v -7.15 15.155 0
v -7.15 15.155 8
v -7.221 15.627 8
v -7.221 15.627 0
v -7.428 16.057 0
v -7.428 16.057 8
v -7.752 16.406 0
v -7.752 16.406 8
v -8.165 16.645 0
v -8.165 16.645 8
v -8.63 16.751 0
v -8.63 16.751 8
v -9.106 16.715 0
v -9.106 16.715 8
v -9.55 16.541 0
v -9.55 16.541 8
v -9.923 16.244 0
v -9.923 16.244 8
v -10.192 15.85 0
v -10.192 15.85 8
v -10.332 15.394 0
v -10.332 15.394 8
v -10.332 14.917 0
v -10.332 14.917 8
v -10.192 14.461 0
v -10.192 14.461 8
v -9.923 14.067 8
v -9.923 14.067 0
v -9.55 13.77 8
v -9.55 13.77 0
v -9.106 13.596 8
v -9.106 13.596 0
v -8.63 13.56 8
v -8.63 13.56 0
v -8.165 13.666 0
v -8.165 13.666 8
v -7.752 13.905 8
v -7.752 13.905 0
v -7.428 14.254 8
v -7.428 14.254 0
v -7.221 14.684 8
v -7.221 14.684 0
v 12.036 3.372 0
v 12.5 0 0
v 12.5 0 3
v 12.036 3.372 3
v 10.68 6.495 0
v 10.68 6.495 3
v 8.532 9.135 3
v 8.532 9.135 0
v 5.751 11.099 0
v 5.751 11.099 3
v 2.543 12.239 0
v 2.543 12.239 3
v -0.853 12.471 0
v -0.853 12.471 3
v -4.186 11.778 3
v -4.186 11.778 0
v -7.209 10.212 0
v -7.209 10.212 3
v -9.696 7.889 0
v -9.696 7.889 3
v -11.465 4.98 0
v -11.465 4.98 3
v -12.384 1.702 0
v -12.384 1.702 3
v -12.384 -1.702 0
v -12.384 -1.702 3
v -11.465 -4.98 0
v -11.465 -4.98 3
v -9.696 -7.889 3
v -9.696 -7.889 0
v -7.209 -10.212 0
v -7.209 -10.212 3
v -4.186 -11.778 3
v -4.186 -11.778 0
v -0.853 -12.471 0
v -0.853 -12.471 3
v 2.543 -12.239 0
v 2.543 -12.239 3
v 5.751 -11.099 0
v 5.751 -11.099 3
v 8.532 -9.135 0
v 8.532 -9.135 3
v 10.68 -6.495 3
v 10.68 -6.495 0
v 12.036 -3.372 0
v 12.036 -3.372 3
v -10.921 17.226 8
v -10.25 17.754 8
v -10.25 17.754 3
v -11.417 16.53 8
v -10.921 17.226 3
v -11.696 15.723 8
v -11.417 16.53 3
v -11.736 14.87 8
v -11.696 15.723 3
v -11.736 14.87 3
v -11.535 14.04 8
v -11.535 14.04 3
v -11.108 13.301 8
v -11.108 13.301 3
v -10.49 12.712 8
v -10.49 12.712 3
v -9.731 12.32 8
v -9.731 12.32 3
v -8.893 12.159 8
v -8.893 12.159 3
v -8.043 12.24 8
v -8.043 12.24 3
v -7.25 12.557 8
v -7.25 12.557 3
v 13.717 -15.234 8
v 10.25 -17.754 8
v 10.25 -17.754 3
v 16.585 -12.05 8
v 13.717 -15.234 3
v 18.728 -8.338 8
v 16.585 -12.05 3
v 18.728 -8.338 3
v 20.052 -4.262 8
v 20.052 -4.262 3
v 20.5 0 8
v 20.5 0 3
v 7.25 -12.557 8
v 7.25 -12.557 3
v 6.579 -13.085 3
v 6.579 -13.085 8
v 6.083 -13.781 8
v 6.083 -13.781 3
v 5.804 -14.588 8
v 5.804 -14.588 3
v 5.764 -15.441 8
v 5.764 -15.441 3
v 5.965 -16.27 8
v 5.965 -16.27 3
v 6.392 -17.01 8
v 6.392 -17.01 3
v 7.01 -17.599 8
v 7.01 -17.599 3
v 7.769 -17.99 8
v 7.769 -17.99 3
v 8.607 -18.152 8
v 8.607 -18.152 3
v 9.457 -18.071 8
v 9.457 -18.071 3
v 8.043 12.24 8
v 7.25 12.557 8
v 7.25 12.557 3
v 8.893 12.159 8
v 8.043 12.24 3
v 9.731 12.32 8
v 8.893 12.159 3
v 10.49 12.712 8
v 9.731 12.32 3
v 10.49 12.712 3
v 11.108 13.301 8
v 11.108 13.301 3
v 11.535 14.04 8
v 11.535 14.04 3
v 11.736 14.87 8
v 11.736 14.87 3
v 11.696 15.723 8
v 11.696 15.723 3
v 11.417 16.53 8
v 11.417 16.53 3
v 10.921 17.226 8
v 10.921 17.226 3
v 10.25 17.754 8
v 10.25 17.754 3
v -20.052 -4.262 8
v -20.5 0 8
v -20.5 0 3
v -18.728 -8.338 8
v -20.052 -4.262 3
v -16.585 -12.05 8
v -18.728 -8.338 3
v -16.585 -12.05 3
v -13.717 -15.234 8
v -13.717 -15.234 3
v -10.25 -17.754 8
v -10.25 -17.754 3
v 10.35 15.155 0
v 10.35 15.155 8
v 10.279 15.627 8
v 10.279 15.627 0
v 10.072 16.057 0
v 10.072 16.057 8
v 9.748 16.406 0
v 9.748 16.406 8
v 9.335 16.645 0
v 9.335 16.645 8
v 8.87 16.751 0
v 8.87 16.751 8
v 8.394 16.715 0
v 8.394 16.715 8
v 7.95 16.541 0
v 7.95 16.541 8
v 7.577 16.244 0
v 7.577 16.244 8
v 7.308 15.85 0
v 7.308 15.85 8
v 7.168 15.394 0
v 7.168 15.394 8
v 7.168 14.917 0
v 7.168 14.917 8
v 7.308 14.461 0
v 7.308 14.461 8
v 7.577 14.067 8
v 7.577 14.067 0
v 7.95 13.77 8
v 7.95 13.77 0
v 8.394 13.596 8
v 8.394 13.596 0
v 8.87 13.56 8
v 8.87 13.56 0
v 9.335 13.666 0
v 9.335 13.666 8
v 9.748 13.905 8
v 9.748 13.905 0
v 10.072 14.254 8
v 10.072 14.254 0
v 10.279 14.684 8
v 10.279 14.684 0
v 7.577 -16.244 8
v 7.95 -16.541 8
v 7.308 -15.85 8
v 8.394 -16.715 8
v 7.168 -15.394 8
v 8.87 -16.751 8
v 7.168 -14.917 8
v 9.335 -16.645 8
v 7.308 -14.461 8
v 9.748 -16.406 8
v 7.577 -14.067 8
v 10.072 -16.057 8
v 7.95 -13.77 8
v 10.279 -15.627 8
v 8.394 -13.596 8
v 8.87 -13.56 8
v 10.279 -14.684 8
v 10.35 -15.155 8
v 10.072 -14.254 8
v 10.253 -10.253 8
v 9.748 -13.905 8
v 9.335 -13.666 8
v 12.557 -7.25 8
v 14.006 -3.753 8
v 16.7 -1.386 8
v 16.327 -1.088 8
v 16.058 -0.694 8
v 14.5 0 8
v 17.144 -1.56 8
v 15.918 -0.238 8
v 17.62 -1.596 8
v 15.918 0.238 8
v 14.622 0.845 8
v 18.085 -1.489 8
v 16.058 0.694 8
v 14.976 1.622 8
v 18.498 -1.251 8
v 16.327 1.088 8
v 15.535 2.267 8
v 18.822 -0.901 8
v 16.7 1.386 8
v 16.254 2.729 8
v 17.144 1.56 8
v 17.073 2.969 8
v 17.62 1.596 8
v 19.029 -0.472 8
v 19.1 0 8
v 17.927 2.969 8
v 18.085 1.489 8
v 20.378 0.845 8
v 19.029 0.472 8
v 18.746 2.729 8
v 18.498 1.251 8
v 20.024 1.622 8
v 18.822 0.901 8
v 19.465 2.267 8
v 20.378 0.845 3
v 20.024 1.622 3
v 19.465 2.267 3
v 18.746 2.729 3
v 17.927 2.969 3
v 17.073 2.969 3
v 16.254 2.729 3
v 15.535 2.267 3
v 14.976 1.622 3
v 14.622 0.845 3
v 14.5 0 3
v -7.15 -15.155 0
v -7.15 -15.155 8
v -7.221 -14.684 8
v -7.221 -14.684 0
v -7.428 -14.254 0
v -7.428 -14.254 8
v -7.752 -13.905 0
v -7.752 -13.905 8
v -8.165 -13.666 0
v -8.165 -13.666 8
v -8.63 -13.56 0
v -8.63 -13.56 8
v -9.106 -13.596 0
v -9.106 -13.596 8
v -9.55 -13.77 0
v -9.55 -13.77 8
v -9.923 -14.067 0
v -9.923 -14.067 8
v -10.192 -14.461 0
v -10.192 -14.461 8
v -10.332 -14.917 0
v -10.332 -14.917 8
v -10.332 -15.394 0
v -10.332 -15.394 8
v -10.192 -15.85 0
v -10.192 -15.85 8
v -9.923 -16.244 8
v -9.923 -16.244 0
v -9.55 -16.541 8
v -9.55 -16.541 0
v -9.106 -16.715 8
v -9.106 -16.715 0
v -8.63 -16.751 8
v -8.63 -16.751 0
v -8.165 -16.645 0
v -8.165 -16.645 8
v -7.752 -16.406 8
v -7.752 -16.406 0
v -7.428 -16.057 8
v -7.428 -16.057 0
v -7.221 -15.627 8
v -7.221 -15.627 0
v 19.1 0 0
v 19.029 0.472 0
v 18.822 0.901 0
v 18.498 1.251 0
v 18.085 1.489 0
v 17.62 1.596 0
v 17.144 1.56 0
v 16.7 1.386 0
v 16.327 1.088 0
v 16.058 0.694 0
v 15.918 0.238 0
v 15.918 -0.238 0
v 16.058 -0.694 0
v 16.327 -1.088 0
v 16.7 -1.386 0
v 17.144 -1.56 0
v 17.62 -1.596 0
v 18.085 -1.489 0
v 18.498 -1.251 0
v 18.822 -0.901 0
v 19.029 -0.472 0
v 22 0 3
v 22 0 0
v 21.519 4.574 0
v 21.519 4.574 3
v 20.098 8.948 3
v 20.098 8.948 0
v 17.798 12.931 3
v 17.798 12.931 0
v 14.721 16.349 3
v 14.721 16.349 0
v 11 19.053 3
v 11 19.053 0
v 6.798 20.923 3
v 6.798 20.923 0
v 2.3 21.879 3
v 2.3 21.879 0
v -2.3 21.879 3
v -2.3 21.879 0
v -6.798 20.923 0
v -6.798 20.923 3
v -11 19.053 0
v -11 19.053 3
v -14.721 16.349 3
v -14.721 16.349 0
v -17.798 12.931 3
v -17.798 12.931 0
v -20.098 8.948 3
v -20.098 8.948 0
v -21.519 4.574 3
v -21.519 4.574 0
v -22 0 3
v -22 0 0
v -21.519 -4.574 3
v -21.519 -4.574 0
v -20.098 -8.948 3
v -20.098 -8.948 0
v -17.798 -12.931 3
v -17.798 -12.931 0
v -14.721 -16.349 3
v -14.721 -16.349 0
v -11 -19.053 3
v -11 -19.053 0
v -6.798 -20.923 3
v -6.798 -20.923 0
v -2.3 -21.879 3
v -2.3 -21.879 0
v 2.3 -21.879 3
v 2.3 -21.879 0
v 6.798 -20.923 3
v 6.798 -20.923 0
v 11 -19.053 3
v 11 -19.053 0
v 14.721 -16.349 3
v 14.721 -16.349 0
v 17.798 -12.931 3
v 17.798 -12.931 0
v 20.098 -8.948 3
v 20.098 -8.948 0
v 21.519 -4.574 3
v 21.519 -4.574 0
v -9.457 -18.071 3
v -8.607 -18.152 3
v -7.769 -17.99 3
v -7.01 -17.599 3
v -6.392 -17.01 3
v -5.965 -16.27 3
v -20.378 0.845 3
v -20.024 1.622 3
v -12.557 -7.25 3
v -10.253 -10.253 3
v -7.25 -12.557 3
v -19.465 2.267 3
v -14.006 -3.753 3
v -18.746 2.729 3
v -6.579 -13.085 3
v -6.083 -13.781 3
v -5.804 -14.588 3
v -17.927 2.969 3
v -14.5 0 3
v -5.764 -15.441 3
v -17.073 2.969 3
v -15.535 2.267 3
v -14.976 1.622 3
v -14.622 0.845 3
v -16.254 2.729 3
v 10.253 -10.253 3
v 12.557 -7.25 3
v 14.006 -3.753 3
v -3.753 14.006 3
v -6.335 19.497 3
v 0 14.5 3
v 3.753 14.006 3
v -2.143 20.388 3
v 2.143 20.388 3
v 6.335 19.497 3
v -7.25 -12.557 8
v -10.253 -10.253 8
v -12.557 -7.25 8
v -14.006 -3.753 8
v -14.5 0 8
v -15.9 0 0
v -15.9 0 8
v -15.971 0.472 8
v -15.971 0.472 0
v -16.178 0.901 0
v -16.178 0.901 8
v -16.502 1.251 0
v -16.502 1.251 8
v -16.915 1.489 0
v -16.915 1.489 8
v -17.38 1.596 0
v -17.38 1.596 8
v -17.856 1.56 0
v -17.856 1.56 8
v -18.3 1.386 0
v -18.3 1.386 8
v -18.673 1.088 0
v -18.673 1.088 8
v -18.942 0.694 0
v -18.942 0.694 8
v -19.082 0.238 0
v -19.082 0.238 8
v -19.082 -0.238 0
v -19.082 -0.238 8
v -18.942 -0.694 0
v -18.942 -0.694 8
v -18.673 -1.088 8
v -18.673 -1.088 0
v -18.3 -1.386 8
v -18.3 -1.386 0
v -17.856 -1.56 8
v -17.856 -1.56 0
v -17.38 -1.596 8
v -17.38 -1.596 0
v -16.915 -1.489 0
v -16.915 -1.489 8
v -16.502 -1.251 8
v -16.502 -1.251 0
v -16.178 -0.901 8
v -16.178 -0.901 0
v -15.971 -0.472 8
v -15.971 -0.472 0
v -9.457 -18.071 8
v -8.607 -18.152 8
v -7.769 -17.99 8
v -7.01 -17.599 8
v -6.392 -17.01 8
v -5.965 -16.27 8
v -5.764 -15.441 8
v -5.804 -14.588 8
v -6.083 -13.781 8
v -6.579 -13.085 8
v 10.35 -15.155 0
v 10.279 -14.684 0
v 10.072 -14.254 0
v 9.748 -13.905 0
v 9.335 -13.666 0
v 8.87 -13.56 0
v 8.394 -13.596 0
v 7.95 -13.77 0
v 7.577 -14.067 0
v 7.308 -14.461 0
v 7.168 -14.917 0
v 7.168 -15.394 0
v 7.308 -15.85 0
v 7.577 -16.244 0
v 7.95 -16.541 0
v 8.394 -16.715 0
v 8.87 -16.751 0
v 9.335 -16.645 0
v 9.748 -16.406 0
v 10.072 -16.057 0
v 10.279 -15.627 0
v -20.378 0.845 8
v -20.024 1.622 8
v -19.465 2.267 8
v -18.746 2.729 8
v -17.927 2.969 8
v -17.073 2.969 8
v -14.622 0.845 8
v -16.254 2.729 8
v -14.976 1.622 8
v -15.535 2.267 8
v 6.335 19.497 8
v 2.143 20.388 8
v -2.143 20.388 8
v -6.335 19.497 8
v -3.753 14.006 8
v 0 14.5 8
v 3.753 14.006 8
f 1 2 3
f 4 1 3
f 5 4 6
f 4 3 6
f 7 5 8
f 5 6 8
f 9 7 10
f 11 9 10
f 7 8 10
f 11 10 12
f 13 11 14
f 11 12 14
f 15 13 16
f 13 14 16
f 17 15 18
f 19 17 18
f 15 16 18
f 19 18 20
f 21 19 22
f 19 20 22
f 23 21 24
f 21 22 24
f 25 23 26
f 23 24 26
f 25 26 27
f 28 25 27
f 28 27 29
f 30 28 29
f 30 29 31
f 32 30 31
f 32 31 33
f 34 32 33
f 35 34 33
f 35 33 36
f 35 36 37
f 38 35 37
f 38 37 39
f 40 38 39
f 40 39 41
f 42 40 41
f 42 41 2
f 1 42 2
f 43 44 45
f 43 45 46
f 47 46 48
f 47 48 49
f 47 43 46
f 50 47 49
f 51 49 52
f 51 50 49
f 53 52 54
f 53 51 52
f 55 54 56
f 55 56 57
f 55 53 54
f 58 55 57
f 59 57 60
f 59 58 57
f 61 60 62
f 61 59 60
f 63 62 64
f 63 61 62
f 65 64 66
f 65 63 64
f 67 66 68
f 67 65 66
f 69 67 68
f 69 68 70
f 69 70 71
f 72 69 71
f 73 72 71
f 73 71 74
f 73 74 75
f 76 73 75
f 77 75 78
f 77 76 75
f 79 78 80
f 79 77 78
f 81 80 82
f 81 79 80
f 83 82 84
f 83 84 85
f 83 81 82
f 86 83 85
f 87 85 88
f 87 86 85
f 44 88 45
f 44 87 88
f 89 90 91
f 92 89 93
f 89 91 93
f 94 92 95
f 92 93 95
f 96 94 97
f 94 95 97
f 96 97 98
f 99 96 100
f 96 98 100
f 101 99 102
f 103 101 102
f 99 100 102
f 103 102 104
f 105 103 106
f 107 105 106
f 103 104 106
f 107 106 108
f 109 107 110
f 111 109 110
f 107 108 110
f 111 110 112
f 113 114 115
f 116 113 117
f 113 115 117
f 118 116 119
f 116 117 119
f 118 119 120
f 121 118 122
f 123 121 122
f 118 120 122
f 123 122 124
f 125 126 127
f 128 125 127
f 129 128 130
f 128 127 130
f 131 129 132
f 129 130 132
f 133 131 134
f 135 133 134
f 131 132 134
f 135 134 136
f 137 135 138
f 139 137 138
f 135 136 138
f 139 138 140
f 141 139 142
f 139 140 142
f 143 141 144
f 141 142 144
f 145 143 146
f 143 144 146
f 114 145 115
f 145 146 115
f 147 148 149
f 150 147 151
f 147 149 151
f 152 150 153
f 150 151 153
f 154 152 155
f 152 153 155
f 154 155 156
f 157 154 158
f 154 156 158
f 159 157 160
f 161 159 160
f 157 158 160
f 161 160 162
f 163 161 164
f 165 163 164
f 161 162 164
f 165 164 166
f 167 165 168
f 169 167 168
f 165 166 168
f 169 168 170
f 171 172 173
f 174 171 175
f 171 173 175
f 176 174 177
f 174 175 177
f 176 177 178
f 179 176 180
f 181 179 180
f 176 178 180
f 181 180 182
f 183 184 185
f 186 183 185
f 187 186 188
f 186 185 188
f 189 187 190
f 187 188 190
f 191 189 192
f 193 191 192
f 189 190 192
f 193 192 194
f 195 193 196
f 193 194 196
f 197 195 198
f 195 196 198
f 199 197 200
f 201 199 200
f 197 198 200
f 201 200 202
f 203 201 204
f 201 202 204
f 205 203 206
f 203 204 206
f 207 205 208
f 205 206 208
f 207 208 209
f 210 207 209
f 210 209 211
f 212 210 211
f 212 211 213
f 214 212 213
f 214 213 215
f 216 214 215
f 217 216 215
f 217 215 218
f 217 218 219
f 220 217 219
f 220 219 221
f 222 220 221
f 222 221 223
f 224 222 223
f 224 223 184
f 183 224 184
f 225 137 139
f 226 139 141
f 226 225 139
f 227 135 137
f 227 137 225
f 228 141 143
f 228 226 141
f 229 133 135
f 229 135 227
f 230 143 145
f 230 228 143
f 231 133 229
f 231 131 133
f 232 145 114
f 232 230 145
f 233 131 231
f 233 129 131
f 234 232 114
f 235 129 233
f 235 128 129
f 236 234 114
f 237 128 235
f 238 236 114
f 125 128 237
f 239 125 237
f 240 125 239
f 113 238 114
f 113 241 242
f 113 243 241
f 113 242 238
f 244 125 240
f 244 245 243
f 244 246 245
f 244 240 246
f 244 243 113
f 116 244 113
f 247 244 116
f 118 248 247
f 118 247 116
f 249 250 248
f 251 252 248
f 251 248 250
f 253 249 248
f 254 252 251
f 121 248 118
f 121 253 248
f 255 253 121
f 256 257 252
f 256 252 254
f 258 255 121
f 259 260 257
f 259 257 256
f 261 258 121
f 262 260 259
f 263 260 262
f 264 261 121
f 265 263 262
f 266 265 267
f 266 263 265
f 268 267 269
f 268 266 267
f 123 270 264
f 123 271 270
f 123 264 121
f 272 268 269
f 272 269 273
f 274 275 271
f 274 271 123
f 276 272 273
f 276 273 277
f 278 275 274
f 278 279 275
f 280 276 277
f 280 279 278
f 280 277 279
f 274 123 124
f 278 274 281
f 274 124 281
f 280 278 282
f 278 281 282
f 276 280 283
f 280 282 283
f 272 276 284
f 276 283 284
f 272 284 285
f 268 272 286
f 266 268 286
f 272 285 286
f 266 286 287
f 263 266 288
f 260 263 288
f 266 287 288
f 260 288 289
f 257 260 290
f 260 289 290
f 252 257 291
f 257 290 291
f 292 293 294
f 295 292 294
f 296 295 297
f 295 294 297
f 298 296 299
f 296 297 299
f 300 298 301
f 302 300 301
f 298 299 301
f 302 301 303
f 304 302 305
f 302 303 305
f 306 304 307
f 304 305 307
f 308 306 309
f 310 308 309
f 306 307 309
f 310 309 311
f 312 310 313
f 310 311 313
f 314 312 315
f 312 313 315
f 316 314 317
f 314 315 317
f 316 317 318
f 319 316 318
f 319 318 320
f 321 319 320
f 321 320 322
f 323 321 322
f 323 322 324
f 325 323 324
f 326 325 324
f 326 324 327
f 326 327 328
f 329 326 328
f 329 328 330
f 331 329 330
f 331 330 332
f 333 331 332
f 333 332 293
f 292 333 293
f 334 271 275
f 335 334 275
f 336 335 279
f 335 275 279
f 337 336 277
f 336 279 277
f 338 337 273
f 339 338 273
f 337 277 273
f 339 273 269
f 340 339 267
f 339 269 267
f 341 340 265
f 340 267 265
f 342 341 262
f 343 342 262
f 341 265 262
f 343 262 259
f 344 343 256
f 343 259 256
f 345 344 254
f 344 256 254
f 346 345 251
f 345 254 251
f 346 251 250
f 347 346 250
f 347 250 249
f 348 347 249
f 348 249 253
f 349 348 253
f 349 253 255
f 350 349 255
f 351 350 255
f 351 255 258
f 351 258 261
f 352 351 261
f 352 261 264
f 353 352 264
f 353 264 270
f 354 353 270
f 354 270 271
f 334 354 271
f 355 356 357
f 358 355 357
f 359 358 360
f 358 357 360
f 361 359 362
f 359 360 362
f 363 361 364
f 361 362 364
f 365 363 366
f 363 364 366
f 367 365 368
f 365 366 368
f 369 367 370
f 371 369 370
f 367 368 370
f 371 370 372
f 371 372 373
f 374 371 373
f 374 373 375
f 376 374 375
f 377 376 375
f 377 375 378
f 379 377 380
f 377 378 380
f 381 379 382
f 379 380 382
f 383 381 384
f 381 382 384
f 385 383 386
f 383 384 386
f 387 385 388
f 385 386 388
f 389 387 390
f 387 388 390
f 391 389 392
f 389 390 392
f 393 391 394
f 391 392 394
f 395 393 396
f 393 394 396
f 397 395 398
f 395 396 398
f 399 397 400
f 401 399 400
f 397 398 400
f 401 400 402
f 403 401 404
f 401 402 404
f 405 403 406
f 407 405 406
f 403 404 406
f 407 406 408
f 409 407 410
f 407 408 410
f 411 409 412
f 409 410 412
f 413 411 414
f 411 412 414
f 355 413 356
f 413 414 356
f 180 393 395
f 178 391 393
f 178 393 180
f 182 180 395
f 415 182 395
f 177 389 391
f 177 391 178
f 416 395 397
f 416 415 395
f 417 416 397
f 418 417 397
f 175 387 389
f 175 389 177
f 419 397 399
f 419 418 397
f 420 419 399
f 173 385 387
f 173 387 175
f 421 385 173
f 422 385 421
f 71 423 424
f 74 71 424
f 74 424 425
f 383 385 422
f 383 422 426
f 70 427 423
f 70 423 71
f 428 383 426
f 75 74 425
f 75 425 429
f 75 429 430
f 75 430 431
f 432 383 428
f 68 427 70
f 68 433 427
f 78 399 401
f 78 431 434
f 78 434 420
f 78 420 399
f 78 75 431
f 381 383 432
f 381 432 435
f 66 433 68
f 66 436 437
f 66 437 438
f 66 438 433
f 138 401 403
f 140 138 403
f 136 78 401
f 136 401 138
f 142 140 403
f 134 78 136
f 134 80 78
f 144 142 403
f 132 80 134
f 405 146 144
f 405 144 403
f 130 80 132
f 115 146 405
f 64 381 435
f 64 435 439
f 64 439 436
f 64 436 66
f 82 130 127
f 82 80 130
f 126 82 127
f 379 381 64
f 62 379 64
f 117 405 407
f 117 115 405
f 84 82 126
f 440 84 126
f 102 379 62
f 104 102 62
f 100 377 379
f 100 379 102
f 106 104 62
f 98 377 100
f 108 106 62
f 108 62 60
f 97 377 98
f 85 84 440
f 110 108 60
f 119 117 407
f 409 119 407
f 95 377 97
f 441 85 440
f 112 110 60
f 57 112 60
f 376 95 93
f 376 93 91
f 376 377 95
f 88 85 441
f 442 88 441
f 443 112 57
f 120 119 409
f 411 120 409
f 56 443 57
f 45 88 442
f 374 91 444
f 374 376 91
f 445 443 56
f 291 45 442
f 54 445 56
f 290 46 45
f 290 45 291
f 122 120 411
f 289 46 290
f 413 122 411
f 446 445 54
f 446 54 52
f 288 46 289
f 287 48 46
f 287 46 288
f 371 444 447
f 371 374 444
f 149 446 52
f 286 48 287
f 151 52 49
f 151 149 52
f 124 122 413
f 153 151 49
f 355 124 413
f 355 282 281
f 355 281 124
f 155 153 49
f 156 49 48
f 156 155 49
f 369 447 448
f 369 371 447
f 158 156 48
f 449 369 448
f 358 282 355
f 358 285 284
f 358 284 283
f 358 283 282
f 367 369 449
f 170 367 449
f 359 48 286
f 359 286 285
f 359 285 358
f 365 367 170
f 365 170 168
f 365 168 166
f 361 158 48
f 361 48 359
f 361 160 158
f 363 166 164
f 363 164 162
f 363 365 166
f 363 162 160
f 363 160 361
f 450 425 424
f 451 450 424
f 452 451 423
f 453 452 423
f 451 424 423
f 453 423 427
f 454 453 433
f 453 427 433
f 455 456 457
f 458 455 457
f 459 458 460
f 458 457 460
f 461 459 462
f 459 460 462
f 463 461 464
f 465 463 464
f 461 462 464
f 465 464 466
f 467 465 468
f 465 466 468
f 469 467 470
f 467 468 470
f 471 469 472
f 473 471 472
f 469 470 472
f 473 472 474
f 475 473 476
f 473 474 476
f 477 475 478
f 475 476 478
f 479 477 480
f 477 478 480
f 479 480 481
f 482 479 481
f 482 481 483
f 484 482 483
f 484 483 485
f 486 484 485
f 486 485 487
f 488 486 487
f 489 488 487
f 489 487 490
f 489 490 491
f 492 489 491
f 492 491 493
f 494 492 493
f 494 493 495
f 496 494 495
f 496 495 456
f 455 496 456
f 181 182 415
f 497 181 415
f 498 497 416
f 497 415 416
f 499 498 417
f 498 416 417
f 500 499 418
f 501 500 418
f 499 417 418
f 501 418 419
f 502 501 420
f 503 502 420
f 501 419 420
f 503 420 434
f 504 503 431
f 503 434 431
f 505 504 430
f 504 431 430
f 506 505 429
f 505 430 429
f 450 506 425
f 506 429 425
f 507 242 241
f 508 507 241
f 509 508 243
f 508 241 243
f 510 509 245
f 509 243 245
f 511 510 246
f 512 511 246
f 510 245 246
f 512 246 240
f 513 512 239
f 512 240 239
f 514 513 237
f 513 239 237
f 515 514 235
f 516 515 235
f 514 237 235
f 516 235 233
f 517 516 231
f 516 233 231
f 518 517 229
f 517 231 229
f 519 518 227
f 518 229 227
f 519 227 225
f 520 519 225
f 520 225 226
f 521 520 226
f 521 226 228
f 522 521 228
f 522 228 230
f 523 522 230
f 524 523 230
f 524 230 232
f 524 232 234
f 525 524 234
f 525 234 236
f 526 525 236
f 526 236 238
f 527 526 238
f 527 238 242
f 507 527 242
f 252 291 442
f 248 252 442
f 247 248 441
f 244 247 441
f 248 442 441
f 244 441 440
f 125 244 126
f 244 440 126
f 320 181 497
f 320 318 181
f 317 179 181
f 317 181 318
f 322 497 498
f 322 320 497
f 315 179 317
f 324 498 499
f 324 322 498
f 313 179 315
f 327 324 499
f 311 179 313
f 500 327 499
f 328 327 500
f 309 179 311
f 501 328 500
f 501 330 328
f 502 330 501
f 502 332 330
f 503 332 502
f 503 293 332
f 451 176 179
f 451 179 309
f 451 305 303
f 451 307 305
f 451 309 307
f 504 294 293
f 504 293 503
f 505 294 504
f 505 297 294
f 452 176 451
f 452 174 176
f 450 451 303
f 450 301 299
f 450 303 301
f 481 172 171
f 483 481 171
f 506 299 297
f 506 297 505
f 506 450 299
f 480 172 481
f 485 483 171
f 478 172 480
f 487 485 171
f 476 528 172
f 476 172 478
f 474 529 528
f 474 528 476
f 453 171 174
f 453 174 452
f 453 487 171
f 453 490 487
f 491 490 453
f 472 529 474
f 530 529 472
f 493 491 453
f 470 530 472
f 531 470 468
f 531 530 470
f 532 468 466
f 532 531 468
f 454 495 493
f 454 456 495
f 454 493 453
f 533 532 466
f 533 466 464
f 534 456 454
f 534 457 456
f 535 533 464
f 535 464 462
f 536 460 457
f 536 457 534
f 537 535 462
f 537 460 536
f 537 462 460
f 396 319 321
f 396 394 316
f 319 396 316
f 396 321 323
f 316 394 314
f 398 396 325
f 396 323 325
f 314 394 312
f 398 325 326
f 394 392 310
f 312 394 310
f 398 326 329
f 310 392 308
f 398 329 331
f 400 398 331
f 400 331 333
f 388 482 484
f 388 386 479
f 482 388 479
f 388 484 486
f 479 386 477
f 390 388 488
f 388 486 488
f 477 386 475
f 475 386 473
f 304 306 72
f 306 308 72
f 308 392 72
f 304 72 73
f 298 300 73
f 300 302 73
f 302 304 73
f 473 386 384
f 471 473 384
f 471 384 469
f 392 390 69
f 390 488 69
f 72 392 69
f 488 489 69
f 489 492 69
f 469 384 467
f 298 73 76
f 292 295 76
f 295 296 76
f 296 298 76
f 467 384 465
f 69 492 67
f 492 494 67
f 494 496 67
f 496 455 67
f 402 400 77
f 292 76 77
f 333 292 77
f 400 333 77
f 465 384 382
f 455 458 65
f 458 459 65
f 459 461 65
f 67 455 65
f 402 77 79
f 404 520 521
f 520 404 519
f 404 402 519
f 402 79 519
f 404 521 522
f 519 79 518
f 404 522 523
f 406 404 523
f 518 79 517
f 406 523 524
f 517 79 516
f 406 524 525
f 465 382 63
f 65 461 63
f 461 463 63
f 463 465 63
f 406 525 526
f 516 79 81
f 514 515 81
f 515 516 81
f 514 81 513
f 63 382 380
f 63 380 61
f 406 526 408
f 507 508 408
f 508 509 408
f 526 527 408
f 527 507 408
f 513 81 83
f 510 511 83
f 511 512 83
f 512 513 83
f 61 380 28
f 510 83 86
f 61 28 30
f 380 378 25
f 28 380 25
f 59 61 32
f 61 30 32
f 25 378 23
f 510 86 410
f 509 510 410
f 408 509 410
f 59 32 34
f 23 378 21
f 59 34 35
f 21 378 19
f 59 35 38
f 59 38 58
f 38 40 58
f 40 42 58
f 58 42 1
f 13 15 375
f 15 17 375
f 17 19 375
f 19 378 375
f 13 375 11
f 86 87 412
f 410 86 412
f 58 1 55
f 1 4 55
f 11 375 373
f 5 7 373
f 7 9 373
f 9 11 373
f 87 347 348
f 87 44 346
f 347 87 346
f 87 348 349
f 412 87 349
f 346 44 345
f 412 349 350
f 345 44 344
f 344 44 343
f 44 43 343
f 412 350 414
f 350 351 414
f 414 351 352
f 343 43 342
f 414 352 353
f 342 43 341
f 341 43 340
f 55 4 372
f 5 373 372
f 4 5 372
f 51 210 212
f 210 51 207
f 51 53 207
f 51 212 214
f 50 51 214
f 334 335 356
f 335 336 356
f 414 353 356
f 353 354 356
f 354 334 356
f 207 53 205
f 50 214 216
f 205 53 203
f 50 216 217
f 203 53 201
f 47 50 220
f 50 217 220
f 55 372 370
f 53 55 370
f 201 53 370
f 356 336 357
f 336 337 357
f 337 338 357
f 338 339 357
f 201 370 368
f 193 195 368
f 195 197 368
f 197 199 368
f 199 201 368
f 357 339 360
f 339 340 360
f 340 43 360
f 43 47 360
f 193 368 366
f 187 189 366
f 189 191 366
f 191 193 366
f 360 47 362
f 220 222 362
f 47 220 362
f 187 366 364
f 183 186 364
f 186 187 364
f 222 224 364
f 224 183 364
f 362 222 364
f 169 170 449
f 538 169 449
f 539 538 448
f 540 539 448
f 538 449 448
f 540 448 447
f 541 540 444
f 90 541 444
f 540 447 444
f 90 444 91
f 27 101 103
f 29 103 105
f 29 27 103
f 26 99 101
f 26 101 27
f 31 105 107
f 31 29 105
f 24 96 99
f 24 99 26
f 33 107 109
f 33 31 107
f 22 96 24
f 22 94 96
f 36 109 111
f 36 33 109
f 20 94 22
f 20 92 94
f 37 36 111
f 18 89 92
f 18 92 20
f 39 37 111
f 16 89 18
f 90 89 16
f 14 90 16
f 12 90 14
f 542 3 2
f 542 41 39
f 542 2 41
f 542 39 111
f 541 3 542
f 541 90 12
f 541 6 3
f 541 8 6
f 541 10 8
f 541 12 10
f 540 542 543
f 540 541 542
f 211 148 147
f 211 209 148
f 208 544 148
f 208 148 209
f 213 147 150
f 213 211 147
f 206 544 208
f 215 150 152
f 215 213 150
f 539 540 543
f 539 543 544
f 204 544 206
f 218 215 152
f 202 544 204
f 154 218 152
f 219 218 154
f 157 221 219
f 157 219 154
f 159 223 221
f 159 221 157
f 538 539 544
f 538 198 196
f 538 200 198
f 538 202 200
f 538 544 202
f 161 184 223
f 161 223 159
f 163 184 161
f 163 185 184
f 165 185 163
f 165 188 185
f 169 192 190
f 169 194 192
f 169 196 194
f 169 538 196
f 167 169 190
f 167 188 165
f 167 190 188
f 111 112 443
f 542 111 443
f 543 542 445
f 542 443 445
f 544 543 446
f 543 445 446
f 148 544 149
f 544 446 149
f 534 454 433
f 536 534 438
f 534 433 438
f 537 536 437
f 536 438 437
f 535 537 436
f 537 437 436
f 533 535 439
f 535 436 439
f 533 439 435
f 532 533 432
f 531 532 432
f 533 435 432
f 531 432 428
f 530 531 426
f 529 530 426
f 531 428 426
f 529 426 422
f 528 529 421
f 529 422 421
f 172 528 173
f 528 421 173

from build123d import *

# Parameters (mm, degrees)
SKETCH_1_R         = 22
SKETCH_1_R_2       = 12.5
EXTRUDE_1_DEPTH    = 3
EXTRUDE_2_DEPTH    = 8
HOLE_WIZARD_M3_1_D = 3.2


with BuildPart() as part:
    # ｽｹｯﾁ1 → ﾎﾞｽ - 押し出し1 (new body)
    with BuildSketch(Plane.XY):
        Circle(SKETCH_1_R)
        Circle(SKETCH_1_R_2, mode=Mode.SUBTRACT)
    extrude(amount=EXTRUDE_1_DEPTH)

    # ｽｹｯﾁ1<4> → ﾎﾞｽ - 押し出し2 (add)
    with BuildSketch(Plane.XY):
        with BuildLine():
            ThreePointArc((-20.5, 0), (-17.753520778, -10.25), (-10.25, -17.753520778))
            ThreePointArc((-10.25, -17.753520778), (-6.151923789, -16.655444566), (-7.25, -12.557368355))
            ThreePointArc((-7.25, -12.557368355), (-12.557368355, -7.25), (-14.5, 0))
            ThreePointArc((-14.5, 0), (-17.5, 3), (-20.5, 0))
        make_face()
        with BuildLine():
            ThreePointArc((10.25, 17.753520778), (0, 20.5), (-10.25, 17.753520778))
            ThreePointArc((-10.25, 17.753520778), (-11.348076211, 13.655444566), (-7.25, 12.557368355))
            ThreePointArc((-7.25, 12.557368355), (0, 14.5), (7.25, 12.557368355))
            ThreePointArc((7.25, 12.557368355), (11.348076211, 13.655444566), (10.25, 17.753520778))
        make_face()
        with BuildLine():
            ThreePointArc((10.25, -17.753520778), (17.753520778, -10.25), (20.5, 0))
            ThreePointArc((20.5, 0), (17.5, 3), (14.5, 0))
            ThreePointArc((14.5, 0), (12.557368355, -7.25), (7.25, -12.557368355))
            ThreePointArc((7.25, -12.557368355), (6.151923789, -16.655444566), (10.25, -17.753520778))
        make_face()
    extrude(amount=EXTRUDE_2_DEPTH)

    # M3 すきま穴1 (through all)
    with Locations(Plane(origin=(8.75, 15.155444566, 0), x_dir=(-1, 0, 0), z_dir=(0, 0, -1))):
        with Locations((0, 0), (-8.75, -15.155444566), (0, -30.310889132), (17.5, -30.310889132), (26.25, -15.155444566), (17.5, 0)):
            Hole(HOLE_WIZARD_M3_1_D / 2)


solid = part.part
